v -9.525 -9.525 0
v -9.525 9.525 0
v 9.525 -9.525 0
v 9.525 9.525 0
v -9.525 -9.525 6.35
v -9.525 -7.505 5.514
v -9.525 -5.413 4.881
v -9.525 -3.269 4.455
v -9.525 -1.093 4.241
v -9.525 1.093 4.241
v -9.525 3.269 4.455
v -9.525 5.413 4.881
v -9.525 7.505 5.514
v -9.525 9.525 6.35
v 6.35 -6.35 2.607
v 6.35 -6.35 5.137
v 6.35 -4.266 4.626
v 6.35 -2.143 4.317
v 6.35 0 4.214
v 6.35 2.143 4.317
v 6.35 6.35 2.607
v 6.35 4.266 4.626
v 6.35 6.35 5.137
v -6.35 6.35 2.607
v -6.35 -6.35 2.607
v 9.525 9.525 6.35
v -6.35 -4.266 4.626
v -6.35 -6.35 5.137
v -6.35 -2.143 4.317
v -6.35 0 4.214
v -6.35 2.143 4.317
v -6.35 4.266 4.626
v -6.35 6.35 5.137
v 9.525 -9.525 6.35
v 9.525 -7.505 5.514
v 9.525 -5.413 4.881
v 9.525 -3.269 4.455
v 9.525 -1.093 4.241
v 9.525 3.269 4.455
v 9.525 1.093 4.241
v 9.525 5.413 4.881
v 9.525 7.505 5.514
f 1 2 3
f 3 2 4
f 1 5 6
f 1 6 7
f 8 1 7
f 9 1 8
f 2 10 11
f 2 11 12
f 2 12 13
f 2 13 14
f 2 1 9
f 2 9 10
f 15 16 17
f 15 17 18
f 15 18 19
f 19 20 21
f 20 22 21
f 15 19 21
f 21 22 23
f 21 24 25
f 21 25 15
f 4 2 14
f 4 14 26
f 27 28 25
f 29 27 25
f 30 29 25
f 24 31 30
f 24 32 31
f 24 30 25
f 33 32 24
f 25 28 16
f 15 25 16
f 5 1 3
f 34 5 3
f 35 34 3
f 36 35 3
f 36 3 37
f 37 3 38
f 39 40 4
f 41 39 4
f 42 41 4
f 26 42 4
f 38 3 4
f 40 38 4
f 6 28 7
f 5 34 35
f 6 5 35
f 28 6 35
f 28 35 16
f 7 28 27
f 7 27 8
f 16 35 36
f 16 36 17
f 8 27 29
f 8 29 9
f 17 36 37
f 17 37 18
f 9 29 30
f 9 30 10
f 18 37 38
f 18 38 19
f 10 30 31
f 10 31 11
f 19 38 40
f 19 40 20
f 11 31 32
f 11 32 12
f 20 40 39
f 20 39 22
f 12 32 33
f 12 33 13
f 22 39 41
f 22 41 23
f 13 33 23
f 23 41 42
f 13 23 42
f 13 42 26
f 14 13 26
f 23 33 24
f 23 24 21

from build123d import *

# Parameters (mm, degrees)
F0_W     = 19.05
F0_H     = 19.05
F1_DEPTH = 6.35
F2_W     = 12.7
F2_H     = 12.7
F3_DEPTH = 3.74281
F5_DEPTH = 25.4


with BuildPart() as f1:
    # F0 (on Top) → F1 (new body)
    with BuildSketch(Plane.XY):
        Rectangle(F0_W, F0_H)
    extrude(amount=F1_DEPTH)

    # F2 (on face) → F3 (cut)
    with BuildSketch(Plane.XY.offset(6.35)):
        Rectangle(F2_W, F2_H)
    extrude(amount=-F3_DEPTH, mode=Mode.SUBTRACT)

    # F4 (on face) → F5 (cut)
    with BuildSketch(Plane.YZ.offset(9.525)):
        with BuildLine():
            Line((9.525, 6.35), (-9.525, 6.35))
            ThreePointArc((-9.525, 6.35), (0, 4.214056), (9.525, 6.35))
        make_face()
    extrude(amount=-F5_DEPTH, mode=Mode.SUBTRACT)


solid = f1.part
